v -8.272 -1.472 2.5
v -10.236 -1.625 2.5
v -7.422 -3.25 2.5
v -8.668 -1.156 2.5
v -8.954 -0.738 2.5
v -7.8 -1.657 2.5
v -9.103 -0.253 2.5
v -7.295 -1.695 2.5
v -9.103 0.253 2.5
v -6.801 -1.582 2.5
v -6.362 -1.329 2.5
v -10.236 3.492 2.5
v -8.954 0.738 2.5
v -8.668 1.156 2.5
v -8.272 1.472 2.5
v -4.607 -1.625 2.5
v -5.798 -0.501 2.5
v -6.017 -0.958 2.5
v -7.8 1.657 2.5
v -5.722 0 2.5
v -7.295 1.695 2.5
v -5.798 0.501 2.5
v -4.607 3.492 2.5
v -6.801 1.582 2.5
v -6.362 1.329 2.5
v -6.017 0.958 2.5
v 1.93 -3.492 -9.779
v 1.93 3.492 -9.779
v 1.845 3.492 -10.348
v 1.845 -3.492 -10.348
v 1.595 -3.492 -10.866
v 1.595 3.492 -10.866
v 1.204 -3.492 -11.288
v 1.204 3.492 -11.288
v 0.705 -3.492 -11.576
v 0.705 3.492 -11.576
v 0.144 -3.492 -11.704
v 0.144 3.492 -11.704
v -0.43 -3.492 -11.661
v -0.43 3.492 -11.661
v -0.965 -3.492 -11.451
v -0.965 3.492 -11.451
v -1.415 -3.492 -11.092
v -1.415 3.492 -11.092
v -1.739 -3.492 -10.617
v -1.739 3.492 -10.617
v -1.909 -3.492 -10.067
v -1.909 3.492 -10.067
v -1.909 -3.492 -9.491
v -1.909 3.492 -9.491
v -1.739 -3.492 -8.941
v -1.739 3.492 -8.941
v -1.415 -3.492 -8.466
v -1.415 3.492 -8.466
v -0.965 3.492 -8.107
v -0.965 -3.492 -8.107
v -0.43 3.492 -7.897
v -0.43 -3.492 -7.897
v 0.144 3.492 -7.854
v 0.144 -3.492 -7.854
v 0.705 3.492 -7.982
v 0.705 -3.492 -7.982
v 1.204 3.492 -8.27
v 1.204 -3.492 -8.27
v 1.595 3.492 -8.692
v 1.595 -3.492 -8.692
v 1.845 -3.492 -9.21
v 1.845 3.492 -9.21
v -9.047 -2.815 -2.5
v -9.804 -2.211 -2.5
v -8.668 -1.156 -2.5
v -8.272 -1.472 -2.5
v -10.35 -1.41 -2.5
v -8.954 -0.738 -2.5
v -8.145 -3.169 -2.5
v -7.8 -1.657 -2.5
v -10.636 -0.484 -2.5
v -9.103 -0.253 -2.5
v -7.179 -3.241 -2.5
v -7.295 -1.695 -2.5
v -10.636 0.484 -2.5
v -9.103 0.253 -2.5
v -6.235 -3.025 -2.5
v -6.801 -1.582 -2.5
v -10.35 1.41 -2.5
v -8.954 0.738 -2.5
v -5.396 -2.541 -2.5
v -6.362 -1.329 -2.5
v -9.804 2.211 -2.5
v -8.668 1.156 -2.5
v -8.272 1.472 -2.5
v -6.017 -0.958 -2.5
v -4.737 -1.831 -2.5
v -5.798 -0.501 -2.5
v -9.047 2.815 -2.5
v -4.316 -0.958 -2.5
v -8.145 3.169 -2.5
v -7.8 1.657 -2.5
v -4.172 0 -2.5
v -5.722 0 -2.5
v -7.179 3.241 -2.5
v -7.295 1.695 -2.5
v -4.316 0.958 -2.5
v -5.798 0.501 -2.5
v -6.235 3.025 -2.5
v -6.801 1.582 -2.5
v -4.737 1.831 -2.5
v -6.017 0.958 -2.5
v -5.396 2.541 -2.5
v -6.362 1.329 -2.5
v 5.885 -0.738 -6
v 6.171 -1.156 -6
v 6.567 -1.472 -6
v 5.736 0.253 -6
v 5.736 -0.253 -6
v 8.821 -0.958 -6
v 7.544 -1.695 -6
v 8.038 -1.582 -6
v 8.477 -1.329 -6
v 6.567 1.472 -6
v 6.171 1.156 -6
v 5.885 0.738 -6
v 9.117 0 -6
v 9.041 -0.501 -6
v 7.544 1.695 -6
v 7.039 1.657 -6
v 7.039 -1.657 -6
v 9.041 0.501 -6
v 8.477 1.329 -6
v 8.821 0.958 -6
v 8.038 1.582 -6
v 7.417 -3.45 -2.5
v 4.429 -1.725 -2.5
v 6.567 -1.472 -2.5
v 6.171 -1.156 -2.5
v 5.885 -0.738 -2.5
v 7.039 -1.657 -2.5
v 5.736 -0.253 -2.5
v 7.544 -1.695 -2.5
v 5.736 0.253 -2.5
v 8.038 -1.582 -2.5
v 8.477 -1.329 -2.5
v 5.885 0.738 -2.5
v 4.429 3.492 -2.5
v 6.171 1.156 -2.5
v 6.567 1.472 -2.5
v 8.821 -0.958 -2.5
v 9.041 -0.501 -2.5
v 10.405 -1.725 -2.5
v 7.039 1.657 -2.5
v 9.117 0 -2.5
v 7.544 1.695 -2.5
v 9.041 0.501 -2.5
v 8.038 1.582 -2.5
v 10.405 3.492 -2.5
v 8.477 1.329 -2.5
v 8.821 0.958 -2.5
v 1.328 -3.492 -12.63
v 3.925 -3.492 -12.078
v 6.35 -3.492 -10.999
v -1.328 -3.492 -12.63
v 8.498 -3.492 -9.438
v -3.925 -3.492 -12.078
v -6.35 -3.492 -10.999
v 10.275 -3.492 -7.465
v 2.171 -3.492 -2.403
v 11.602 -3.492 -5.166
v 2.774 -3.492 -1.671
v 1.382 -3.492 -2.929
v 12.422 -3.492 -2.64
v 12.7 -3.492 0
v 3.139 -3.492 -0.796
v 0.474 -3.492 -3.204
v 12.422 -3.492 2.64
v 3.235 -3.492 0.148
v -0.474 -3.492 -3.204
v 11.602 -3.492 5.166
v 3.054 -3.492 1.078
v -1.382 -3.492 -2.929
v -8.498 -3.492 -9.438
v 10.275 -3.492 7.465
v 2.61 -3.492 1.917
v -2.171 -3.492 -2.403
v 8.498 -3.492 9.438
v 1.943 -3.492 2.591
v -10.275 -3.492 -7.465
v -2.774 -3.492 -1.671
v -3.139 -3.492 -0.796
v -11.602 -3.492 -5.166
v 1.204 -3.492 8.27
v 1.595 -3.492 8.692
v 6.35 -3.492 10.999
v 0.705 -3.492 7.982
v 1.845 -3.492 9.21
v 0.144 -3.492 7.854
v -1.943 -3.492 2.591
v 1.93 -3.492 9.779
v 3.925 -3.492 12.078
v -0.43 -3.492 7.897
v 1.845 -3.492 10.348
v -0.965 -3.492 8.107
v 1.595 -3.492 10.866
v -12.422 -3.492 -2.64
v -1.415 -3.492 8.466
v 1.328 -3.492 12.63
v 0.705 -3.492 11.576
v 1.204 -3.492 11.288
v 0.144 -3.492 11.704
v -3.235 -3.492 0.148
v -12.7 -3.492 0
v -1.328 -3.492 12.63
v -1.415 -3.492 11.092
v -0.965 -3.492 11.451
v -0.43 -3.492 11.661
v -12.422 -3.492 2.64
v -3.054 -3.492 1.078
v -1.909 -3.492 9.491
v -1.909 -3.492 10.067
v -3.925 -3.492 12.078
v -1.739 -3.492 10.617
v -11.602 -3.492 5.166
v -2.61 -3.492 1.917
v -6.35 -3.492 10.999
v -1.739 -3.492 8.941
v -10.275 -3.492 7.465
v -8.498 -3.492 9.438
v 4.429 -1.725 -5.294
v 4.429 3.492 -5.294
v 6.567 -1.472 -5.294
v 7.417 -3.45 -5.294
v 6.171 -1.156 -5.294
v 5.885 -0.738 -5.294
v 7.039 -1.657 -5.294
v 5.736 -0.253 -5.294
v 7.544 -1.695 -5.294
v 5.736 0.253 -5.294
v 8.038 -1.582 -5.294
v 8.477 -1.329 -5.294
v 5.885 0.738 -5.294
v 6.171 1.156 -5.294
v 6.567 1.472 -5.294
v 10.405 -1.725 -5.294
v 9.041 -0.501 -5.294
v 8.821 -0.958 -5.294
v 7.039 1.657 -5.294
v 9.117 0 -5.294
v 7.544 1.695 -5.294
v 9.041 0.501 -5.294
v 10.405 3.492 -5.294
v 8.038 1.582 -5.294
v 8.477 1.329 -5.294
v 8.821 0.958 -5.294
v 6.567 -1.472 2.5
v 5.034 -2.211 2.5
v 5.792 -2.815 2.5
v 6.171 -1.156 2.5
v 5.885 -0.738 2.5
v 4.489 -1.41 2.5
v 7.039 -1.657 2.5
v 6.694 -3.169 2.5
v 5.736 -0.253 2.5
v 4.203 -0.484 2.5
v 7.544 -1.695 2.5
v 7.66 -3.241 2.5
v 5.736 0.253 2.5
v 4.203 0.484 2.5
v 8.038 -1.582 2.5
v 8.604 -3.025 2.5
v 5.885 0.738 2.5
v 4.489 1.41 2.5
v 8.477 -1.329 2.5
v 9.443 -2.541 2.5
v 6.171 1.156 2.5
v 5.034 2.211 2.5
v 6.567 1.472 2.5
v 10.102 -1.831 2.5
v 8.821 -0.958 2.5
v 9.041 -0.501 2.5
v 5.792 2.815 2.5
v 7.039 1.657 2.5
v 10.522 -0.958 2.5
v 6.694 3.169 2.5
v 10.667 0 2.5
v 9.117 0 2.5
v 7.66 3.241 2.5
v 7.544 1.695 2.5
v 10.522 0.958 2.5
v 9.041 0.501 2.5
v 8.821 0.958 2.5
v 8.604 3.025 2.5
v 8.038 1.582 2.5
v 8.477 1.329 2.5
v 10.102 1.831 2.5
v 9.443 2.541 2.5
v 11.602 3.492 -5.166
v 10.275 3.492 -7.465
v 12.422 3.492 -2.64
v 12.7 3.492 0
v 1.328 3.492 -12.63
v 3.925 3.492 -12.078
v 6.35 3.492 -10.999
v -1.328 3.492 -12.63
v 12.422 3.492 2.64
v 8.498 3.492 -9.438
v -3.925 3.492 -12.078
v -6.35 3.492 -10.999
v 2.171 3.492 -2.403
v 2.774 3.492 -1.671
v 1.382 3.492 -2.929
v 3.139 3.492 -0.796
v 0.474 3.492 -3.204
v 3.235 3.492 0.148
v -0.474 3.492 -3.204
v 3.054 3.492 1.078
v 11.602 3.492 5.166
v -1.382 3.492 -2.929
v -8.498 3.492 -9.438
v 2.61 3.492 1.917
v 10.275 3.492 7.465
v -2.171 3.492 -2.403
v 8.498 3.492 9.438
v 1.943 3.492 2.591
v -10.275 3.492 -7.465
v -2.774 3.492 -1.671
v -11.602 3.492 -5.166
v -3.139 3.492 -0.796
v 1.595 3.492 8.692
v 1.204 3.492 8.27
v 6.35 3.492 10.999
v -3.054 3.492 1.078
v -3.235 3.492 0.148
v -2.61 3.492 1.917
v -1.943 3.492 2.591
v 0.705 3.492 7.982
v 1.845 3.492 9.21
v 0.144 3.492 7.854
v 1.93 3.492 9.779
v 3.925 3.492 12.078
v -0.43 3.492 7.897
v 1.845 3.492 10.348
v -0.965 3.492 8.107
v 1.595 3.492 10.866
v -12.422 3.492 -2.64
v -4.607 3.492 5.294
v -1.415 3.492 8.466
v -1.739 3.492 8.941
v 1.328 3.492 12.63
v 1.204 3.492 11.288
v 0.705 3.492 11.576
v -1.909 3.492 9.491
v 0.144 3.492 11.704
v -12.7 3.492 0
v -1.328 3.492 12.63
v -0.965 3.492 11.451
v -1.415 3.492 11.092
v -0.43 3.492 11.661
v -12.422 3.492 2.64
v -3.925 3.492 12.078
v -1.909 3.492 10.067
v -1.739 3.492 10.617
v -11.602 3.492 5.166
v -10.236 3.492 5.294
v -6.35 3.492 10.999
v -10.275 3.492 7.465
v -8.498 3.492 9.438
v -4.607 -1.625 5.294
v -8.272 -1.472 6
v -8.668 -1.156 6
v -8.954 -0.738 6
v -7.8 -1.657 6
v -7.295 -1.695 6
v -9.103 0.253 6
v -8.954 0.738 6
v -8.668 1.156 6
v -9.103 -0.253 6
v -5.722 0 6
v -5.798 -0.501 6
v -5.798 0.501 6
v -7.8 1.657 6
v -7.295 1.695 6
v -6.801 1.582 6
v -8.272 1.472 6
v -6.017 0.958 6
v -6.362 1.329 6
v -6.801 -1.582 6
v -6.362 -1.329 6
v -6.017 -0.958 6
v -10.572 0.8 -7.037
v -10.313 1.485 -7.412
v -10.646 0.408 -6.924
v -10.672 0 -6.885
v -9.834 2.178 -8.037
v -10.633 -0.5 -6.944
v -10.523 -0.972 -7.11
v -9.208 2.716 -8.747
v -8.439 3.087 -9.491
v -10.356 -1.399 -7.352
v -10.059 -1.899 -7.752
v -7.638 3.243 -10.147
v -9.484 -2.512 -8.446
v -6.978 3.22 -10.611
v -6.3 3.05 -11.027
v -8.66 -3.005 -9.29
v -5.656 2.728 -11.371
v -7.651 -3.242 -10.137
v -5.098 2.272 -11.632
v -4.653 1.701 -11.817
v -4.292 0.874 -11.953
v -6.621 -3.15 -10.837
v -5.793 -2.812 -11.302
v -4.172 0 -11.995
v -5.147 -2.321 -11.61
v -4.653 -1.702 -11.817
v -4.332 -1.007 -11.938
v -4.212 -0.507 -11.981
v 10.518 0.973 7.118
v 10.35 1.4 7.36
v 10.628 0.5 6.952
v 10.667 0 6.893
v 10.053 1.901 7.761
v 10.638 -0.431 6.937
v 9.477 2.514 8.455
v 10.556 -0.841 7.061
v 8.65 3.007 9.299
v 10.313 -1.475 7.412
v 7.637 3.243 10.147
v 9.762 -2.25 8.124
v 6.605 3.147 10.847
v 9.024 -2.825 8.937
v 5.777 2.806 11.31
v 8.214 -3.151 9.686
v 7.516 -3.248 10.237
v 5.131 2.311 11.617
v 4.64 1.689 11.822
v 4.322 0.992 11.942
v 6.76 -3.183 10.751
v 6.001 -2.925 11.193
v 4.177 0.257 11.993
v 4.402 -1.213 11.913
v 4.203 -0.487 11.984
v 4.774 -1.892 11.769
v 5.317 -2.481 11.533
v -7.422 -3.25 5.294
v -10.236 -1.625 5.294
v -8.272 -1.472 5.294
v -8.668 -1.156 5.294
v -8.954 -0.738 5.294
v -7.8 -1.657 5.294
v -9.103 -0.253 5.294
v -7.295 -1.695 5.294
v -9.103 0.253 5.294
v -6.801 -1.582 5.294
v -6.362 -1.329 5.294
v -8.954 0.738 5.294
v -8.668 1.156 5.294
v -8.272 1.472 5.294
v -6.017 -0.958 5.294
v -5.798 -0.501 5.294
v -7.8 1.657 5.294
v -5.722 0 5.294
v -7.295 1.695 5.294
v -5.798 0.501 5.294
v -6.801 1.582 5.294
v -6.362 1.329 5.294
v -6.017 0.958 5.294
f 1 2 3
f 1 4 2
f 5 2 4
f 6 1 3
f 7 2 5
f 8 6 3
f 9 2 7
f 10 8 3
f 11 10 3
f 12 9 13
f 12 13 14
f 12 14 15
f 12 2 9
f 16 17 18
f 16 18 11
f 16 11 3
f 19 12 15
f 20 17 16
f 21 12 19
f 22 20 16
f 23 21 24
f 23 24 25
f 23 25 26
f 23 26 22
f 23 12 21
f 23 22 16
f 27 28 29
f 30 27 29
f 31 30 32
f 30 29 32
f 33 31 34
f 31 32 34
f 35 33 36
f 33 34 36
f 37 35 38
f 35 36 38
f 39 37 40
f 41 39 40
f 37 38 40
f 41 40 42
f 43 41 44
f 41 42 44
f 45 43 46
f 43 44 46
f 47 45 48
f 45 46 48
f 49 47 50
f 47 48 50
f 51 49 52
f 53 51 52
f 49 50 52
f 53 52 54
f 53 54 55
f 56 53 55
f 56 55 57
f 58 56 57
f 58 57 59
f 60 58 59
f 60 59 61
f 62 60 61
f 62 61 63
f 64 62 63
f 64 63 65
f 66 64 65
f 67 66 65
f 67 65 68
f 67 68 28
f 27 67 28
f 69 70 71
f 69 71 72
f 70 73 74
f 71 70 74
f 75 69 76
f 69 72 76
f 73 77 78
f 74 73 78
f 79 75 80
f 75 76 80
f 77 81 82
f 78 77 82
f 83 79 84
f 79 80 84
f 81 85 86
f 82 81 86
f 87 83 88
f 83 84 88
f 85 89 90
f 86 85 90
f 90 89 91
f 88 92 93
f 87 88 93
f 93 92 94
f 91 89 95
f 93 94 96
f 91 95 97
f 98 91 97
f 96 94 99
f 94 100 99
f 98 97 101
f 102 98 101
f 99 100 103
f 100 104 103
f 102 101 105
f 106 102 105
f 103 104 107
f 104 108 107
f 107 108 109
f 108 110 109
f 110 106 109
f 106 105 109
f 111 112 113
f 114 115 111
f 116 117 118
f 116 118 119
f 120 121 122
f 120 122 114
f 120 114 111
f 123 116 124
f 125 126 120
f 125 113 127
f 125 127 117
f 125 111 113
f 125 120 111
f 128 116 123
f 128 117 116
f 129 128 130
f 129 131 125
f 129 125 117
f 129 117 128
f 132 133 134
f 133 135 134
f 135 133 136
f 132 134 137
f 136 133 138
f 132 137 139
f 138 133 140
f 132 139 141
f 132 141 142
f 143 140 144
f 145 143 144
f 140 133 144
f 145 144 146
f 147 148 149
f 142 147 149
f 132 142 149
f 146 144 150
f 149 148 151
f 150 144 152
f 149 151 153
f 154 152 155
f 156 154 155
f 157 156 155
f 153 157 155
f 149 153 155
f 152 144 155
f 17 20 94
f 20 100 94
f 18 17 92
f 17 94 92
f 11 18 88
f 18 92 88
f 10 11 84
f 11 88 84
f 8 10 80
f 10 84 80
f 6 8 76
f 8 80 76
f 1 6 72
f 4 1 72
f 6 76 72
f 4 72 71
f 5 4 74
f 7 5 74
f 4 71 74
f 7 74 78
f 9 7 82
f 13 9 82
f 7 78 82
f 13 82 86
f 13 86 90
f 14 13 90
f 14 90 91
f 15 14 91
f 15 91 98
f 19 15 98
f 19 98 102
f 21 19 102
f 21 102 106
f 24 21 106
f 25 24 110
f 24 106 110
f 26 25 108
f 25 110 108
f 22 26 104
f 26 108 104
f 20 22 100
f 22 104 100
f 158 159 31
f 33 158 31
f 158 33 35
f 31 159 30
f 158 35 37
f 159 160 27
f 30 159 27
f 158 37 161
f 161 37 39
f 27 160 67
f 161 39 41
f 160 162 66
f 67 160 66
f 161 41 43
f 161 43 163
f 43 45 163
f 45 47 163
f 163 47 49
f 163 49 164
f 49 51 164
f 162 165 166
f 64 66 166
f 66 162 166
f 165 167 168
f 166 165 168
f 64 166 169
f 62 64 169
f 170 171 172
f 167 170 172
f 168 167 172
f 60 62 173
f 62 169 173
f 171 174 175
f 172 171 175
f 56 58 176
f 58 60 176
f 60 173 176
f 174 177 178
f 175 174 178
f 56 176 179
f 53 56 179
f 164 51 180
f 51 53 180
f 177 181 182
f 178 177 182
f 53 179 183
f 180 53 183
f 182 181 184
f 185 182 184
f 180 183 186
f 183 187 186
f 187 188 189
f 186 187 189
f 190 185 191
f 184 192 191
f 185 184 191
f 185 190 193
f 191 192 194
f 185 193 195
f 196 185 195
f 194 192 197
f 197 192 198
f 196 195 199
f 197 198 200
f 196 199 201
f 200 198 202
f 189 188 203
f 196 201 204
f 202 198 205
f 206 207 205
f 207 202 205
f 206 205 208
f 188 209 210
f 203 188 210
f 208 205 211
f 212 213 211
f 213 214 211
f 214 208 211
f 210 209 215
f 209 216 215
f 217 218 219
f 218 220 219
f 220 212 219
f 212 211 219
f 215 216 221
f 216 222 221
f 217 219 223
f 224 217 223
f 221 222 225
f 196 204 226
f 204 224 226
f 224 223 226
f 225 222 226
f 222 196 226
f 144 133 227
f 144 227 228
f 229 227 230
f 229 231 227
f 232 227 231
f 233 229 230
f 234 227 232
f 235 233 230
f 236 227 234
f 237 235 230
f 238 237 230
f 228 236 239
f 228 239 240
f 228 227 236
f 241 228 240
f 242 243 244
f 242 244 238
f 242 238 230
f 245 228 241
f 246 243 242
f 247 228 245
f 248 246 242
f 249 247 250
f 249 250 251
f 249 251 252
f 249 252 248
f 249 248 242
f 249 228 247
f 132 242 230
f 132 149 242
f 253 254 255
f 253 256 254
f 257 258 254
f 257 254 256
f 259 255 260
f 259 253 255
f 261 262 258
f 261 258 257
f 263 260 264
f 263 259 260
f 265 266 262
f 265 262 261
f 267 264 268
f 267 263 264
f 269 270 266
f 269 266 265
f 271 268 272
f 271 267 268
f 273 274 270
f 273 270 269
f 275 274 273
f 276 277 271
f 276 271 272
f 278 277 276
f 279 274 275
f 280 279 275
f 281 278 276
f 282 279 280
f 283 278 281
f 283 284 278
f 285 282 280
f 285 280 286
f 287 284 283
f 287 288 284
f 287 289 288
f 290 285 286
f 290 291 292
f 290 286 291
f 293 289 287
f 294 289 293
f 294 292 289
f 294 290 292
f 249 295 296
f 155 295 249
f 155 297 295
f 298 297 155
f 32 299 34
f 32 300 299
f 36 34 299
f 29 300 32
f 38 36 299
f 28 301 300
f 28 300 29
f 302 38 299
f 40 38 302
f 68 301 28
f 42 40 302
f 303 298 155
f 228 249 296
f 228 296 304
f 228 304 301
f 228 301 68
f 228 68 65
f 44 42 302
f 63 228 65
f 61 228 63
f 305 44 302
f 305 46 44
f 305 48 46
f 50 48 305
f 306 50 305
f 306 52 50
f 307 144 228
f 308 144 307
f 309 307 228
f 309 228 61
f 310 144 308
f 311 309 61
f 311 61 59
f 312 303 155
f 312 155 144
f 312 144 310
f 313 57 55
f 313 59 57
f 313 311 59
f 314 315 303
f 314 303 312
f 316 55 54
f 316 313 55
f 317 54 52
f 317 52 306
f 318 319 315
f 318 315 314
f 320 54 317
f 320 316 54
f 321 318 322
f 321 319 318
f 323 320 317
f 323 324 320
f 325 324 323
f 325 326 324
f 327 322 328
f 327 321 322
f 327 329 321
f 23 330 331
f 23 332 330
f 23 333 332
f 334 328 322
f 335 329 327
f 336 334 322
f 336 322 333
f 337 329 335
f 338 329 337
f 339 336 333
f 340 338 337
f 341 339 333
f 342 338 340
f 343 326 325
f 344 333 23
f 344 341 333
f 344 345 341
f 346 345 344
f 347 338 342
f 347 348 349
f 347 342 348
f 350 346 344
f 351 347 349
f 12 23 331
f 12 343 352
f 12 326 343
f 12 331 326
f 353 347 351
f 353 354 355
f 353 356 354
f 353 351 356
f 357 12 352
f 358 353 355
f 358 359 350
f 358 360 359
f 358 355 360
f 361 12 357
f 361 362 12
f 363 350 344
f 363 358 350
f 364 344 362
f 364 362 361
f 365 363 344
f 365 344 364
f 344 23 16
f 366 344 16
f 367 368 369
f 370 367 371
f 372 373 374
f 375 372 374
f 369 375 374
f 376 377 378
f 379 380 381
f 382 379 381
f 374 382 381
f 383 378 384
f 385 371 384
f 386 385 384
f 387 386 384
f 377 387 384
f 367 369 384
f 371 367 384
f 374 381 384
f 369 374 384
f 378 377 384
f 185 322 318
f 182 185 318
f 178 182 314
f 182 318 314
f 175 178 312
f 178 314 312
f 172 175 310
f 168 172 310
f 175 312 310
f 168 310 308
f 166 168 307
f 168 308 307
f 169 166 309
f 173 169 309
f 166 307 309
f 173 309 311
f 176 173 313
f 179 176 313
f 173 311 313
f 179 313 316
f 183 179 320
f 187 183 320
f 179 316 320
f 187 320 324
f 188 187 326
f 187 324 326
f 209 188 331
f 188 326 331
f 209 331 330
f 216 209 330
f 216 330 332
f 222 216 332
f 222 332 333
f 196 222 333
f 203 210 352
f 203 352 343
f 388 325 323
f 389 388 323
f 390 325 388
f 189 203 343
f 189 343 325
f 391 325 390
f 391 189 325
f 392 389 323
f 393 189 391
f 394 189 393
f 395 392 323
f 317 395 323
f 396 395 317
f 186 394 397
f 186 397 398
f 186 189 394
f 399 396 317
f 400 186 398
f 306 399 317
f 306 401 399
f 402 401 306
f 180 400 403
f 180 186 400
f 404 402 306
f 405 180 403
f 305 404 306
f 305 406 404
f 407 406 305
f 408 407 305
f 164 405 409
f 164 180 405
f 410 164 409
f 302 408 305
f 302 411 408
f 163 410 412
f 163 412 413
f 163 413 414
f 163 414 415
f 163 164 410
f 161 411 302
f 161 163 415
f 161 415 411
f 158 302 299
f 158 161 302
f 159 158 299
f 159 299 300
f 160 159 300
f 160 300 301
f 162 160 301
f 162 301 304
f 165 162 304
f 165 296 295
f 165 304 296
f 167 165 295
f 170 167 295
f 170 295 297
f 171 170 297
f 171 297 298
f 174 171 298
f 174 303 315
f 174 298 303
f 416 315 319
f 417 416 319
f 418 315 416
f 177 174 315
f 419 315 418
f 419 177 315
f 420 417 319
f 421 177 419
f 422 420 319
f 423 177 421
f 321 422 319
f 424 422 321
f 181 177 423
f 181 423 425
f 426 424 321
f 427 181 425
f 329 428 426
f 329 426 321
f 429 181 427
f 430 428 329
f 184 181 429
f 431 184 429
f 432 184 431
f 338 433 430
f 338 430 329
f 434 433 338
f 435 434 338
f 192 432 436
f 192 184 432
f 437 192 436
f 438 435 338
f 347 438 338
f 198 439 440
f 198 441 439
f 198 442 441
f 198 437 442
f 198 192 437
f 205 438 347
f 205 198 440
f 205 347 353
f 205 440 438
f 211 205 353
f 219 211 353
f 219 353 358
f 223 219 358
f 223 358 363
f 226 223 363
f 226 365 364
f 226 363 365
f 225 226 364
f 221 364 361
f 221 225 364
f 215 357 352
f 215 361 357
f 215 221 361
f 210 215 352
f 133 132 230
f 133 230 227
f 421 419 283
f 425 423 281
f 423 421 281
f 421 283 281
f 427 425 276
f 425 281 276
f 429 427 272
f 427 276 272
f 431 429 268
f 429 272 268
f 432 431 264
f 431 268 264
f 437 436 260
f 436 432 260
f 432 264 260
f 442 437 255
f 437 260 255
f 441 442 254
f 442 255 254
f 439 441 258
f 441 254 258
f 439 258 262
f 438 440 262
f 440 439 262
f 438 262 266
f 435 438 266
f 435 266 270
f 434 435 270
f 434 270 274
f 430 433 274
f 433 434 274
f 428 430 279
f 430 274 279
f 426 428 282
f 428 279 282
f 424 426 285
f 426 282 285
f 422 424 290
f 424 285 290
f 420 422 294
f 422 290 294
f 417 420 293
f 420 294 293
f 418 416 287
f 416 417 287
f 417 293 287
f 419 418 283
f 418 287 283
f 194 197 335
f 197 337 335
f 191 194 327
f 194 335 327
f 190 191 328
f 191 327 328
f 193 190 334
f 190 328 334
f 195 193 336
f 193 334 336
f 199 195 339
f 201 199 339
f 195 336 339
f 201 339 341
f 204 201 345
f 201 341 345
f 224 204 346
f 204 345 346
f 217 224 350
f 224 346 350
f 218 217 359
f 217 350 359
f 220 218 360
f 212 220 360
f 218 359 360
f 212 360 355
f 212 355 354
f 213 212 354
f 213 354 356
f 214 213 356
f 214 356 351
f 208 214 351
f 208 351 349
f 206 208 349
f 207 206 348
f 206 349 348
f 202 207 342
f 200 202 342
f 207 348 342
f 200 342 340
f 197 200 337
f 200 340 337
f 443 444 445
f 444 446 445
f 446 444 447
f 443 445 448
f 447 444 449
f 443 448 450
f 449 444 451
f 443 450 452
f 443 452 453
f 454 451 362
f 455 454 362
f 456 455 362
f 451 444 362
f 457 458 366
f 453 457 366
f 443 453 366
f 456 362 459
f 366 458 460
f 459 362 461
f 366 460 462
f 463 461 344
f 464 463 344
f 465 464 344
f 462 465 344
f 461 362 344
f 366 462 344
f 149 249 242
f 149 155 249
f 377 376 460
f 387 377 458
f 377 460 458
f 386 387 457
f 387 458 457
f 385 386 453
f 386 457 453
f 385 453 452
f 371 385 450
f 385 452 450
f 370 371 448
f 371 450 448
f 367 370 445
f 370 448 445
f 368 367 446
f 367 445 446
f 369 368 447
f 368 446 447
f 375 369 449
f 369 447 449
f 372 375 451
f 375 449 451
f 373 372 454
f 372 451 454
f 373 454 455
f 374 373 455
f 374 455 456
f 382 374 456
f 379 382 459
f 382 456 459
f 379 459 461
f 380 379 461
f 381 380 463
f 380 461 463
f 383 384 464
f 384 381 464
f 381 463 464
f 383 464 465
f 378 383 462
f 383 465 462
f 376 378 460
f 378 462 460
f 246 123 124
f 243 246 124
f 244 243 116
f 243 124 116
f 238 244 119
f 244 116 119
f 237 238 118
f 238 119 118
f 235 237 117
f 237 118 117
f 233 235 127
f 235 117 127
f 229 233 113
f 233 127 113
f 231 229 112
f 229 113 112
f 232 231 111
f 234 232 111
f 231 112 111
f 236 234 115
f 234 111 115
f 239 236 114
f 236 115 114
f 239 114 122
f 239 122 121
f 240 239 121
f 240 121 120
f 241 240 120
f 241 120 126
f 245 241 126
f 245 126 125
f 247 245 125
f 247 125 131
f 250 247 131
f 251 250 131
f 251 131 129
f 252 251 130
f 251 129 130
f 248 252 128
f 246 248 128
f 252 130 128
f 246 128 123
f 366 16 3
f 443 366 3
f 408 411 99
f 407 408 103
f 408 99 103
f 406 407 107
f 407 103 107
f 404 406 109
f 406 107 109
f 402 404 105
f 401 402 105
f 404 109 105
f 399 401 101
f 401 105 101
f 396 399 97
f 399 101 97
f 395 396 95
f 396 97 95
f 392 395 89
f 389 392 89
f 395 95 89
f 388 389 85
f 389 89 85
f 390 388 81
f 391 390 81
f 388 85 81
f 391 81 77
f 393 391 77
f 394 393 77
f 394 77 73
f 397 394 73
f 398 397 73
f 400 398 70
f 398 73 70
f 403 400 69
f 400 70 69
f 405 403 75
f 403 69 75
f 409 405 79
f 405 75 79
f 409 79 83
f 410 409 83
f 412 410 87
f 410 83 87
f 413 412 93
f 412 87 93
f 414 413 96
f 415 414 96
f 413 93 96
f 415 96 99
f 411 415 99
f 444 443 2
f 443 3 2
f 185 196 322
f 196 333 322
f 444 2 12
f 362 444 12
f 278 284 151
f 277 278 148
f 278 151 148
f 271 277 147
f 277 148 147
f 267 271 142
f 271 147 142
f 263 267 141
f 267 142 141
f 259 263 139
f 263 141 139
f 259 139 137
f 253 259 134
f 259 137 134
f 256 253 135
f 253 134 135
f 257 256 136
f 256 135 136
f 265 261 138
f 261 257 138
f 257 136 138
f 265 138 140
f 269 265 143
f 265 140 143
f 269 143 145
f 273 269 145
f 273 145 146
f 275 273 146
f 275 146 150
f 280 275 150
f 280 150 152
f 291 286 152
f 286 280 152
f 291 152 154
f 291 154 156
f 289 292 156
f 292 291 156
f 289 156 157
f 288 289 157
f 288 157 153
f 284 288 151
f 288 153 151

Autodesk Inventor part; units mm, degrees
sketch "Sketch1" plane through (0, 0, 0) normal (0, 1, 0) x (-1, 0, 0)
  circle A0 centre (0, 0) radius 12.7
  dimension "d75" = 25.4
extrude "Extrusion1" add sketch "Sketch1" along normal blind 3.4925 and the other way blind 3.4925
ref_plane "Work Plane1" through (0, 0, 2.5) normal (0, 0, 1) x (1, 0, 0)
ref_plane "Work Plane2" through (0, 0, -2.5) normal (0, 0, 1) x (1, 0, 0)
sketch "Sketch2" plane through (0, 0, 0) normal (0, 0, 1) x (1, 0, 0)
  circle A0 centre (7.4168, 0) radius 1.7
  circle A1 centre (-7.4168, 0) radius 1.7
  point P0 (0, 0)
  dimension "d5" = 3.4
  dimension "d6" = 7.4168
  dimension "d7" = 3.4
  dimension "d8" = 7.4168
extrude "Screw hole 2" cut sketch "Sketch2" along normal blind 2.5 and the other way blind 6 contours A0
sketch "Sketch3" plane through (0, 0, 2.5) normal (0, 0, 1) x (1, 0, 0)
  circle A0 centre (7.4168, 0) radius 1.7 projected
  circle A1 centre (7.4168, 0) radius 3.25
  point P0 (0, 0)
  dimension "d19" = 6.5
sketch "Sketch4" plane through (0, 0, -2.5) normal (0, 0, 1) x (1, 0, 0)
  circle A0 centre (7.4168, 0) radius 1.7 projected
  circle A1 centre (7.4168, 0) radius 3.45 construction
  line L0 (7.4168, -3.45) -> (4.429, -1.725)
  line L1 (4.429, -1.725) -> (4.429, 6.985)
  line L2 (10.4046, 6.985) -> (10.4046, -1.725)
  line L3 (10.4046, -1.725) -> (7.4168, -3.45)
  line L4 (10.4046, 6.985) -> (4.429, 6.985)
  point P0 (0, 0)
  dimension "d22" = 6.9
sketch "Sketch5" plane through (0, 0, -2.5) normal (0, 0, 1) x (1, 0, 0)
  circle A0 centre (-7.422, 0) radius 3.25
  point P0 (0, 0)
  dimension "d25" = 6.5
extrude "Access Hole 1" cut sketch "Sketch5" against normal through all
extrude "Access Hole 2" cut sketch "Sketch3" along normal through all contours A0 | A1
extrude "Nut well 2" cut sketch "Sketch4" against normal blind 2.794 contours A0 | L0 L1 L4 L2 L3
sketch "Sketch7" plane through (0, 0, 2.5) normal (0, 0, 1) x (1, 0, 0)
  circle A0 centre (-7.422, 0) radius 3.25 construction
  circle A1 centre (-7.422, 0) radius 3.45 construction
  line L0 (-7.422, -3.25) -> (-10.2365, -1.625)
  line L1 (-10.2365, -1.625) -> (-10.2365, 5.3975)
  line L2 (-4.6074, 5.3975) -> (-4.6074, -1.625)
  line L3 (-4.6074, -1.625) -> (-7.422, -3.25)
  line L4 (16.6201, 5.3975) -> (-16.6201, 5.3975) projected
  line L5 (-10.2365, 5.3975) -> (-4.6074, 5.3975)
  point P0 (0, 0)
  dimension "d48" = 6.9
extrude "Nut Well 1" cut sketch "Sketch7" along normal blind 2.794
sketch "Sketch8" plane through (0, 0, 0) normal (0, 0, 1) x (1, 0, 0)
  circle A0 centre (-7.422, 0) radius 3.25 projected
  circle A1 centre (-7.422, 0) radius 1.7
  point P0 (0, 0)
  dimension "d51" = 3.4
extrude "Screw Hole 1" cut sketch "Sketch8" along normal blind 6 and the other way blind 2.5 contours A1
ref_plane "Work Plane3" through (0, 5.3975, 0) normal (0, 1, 0) x (1, 0, 0)
sketch "Sketch9" plane through (0, 5.3975, 0) normal (0, 1, 0) x (1, 0, 0)
  arc A0 (1.9431, -2.5908) -> (-1.9431, -2.5908) centre (0, 0) ccw
  line L0 (-1.9431, -2.5908) -> (1.9431, -2.5908)
  dimension "d56" = 6.477
  dimension "d57" = 2.5908
extrude "Center shaft" cut sketch "Sketch9" against normal through all
ref_plane "Work Plane4" through (0, 5.3975, 0) normal (0, 1, 0) x (1, 0, 0)
sketch "Sketch10" plane through (0, 5.3975, 0) normal (0, 1, 0) x (1, 0, 0)
  circle A0 centre (0, 9.779) radius 1.9304
  circle A1 centre (0, -9.779) radius 1.9304
  point P0 (0, 0)
  point P1 (0, -8.001)
  dimension "d60" = 3.8608
  dimension "d61" = 9.779
  dimension "d62" = 3.8608
  dimension "d63" = 9.779
extrude "Wheel holes" cut sketch "Sketch10" against normal through all
equation "\"d63\" = d61"
properties part number "clamping hub .770 .25 D bore base"
